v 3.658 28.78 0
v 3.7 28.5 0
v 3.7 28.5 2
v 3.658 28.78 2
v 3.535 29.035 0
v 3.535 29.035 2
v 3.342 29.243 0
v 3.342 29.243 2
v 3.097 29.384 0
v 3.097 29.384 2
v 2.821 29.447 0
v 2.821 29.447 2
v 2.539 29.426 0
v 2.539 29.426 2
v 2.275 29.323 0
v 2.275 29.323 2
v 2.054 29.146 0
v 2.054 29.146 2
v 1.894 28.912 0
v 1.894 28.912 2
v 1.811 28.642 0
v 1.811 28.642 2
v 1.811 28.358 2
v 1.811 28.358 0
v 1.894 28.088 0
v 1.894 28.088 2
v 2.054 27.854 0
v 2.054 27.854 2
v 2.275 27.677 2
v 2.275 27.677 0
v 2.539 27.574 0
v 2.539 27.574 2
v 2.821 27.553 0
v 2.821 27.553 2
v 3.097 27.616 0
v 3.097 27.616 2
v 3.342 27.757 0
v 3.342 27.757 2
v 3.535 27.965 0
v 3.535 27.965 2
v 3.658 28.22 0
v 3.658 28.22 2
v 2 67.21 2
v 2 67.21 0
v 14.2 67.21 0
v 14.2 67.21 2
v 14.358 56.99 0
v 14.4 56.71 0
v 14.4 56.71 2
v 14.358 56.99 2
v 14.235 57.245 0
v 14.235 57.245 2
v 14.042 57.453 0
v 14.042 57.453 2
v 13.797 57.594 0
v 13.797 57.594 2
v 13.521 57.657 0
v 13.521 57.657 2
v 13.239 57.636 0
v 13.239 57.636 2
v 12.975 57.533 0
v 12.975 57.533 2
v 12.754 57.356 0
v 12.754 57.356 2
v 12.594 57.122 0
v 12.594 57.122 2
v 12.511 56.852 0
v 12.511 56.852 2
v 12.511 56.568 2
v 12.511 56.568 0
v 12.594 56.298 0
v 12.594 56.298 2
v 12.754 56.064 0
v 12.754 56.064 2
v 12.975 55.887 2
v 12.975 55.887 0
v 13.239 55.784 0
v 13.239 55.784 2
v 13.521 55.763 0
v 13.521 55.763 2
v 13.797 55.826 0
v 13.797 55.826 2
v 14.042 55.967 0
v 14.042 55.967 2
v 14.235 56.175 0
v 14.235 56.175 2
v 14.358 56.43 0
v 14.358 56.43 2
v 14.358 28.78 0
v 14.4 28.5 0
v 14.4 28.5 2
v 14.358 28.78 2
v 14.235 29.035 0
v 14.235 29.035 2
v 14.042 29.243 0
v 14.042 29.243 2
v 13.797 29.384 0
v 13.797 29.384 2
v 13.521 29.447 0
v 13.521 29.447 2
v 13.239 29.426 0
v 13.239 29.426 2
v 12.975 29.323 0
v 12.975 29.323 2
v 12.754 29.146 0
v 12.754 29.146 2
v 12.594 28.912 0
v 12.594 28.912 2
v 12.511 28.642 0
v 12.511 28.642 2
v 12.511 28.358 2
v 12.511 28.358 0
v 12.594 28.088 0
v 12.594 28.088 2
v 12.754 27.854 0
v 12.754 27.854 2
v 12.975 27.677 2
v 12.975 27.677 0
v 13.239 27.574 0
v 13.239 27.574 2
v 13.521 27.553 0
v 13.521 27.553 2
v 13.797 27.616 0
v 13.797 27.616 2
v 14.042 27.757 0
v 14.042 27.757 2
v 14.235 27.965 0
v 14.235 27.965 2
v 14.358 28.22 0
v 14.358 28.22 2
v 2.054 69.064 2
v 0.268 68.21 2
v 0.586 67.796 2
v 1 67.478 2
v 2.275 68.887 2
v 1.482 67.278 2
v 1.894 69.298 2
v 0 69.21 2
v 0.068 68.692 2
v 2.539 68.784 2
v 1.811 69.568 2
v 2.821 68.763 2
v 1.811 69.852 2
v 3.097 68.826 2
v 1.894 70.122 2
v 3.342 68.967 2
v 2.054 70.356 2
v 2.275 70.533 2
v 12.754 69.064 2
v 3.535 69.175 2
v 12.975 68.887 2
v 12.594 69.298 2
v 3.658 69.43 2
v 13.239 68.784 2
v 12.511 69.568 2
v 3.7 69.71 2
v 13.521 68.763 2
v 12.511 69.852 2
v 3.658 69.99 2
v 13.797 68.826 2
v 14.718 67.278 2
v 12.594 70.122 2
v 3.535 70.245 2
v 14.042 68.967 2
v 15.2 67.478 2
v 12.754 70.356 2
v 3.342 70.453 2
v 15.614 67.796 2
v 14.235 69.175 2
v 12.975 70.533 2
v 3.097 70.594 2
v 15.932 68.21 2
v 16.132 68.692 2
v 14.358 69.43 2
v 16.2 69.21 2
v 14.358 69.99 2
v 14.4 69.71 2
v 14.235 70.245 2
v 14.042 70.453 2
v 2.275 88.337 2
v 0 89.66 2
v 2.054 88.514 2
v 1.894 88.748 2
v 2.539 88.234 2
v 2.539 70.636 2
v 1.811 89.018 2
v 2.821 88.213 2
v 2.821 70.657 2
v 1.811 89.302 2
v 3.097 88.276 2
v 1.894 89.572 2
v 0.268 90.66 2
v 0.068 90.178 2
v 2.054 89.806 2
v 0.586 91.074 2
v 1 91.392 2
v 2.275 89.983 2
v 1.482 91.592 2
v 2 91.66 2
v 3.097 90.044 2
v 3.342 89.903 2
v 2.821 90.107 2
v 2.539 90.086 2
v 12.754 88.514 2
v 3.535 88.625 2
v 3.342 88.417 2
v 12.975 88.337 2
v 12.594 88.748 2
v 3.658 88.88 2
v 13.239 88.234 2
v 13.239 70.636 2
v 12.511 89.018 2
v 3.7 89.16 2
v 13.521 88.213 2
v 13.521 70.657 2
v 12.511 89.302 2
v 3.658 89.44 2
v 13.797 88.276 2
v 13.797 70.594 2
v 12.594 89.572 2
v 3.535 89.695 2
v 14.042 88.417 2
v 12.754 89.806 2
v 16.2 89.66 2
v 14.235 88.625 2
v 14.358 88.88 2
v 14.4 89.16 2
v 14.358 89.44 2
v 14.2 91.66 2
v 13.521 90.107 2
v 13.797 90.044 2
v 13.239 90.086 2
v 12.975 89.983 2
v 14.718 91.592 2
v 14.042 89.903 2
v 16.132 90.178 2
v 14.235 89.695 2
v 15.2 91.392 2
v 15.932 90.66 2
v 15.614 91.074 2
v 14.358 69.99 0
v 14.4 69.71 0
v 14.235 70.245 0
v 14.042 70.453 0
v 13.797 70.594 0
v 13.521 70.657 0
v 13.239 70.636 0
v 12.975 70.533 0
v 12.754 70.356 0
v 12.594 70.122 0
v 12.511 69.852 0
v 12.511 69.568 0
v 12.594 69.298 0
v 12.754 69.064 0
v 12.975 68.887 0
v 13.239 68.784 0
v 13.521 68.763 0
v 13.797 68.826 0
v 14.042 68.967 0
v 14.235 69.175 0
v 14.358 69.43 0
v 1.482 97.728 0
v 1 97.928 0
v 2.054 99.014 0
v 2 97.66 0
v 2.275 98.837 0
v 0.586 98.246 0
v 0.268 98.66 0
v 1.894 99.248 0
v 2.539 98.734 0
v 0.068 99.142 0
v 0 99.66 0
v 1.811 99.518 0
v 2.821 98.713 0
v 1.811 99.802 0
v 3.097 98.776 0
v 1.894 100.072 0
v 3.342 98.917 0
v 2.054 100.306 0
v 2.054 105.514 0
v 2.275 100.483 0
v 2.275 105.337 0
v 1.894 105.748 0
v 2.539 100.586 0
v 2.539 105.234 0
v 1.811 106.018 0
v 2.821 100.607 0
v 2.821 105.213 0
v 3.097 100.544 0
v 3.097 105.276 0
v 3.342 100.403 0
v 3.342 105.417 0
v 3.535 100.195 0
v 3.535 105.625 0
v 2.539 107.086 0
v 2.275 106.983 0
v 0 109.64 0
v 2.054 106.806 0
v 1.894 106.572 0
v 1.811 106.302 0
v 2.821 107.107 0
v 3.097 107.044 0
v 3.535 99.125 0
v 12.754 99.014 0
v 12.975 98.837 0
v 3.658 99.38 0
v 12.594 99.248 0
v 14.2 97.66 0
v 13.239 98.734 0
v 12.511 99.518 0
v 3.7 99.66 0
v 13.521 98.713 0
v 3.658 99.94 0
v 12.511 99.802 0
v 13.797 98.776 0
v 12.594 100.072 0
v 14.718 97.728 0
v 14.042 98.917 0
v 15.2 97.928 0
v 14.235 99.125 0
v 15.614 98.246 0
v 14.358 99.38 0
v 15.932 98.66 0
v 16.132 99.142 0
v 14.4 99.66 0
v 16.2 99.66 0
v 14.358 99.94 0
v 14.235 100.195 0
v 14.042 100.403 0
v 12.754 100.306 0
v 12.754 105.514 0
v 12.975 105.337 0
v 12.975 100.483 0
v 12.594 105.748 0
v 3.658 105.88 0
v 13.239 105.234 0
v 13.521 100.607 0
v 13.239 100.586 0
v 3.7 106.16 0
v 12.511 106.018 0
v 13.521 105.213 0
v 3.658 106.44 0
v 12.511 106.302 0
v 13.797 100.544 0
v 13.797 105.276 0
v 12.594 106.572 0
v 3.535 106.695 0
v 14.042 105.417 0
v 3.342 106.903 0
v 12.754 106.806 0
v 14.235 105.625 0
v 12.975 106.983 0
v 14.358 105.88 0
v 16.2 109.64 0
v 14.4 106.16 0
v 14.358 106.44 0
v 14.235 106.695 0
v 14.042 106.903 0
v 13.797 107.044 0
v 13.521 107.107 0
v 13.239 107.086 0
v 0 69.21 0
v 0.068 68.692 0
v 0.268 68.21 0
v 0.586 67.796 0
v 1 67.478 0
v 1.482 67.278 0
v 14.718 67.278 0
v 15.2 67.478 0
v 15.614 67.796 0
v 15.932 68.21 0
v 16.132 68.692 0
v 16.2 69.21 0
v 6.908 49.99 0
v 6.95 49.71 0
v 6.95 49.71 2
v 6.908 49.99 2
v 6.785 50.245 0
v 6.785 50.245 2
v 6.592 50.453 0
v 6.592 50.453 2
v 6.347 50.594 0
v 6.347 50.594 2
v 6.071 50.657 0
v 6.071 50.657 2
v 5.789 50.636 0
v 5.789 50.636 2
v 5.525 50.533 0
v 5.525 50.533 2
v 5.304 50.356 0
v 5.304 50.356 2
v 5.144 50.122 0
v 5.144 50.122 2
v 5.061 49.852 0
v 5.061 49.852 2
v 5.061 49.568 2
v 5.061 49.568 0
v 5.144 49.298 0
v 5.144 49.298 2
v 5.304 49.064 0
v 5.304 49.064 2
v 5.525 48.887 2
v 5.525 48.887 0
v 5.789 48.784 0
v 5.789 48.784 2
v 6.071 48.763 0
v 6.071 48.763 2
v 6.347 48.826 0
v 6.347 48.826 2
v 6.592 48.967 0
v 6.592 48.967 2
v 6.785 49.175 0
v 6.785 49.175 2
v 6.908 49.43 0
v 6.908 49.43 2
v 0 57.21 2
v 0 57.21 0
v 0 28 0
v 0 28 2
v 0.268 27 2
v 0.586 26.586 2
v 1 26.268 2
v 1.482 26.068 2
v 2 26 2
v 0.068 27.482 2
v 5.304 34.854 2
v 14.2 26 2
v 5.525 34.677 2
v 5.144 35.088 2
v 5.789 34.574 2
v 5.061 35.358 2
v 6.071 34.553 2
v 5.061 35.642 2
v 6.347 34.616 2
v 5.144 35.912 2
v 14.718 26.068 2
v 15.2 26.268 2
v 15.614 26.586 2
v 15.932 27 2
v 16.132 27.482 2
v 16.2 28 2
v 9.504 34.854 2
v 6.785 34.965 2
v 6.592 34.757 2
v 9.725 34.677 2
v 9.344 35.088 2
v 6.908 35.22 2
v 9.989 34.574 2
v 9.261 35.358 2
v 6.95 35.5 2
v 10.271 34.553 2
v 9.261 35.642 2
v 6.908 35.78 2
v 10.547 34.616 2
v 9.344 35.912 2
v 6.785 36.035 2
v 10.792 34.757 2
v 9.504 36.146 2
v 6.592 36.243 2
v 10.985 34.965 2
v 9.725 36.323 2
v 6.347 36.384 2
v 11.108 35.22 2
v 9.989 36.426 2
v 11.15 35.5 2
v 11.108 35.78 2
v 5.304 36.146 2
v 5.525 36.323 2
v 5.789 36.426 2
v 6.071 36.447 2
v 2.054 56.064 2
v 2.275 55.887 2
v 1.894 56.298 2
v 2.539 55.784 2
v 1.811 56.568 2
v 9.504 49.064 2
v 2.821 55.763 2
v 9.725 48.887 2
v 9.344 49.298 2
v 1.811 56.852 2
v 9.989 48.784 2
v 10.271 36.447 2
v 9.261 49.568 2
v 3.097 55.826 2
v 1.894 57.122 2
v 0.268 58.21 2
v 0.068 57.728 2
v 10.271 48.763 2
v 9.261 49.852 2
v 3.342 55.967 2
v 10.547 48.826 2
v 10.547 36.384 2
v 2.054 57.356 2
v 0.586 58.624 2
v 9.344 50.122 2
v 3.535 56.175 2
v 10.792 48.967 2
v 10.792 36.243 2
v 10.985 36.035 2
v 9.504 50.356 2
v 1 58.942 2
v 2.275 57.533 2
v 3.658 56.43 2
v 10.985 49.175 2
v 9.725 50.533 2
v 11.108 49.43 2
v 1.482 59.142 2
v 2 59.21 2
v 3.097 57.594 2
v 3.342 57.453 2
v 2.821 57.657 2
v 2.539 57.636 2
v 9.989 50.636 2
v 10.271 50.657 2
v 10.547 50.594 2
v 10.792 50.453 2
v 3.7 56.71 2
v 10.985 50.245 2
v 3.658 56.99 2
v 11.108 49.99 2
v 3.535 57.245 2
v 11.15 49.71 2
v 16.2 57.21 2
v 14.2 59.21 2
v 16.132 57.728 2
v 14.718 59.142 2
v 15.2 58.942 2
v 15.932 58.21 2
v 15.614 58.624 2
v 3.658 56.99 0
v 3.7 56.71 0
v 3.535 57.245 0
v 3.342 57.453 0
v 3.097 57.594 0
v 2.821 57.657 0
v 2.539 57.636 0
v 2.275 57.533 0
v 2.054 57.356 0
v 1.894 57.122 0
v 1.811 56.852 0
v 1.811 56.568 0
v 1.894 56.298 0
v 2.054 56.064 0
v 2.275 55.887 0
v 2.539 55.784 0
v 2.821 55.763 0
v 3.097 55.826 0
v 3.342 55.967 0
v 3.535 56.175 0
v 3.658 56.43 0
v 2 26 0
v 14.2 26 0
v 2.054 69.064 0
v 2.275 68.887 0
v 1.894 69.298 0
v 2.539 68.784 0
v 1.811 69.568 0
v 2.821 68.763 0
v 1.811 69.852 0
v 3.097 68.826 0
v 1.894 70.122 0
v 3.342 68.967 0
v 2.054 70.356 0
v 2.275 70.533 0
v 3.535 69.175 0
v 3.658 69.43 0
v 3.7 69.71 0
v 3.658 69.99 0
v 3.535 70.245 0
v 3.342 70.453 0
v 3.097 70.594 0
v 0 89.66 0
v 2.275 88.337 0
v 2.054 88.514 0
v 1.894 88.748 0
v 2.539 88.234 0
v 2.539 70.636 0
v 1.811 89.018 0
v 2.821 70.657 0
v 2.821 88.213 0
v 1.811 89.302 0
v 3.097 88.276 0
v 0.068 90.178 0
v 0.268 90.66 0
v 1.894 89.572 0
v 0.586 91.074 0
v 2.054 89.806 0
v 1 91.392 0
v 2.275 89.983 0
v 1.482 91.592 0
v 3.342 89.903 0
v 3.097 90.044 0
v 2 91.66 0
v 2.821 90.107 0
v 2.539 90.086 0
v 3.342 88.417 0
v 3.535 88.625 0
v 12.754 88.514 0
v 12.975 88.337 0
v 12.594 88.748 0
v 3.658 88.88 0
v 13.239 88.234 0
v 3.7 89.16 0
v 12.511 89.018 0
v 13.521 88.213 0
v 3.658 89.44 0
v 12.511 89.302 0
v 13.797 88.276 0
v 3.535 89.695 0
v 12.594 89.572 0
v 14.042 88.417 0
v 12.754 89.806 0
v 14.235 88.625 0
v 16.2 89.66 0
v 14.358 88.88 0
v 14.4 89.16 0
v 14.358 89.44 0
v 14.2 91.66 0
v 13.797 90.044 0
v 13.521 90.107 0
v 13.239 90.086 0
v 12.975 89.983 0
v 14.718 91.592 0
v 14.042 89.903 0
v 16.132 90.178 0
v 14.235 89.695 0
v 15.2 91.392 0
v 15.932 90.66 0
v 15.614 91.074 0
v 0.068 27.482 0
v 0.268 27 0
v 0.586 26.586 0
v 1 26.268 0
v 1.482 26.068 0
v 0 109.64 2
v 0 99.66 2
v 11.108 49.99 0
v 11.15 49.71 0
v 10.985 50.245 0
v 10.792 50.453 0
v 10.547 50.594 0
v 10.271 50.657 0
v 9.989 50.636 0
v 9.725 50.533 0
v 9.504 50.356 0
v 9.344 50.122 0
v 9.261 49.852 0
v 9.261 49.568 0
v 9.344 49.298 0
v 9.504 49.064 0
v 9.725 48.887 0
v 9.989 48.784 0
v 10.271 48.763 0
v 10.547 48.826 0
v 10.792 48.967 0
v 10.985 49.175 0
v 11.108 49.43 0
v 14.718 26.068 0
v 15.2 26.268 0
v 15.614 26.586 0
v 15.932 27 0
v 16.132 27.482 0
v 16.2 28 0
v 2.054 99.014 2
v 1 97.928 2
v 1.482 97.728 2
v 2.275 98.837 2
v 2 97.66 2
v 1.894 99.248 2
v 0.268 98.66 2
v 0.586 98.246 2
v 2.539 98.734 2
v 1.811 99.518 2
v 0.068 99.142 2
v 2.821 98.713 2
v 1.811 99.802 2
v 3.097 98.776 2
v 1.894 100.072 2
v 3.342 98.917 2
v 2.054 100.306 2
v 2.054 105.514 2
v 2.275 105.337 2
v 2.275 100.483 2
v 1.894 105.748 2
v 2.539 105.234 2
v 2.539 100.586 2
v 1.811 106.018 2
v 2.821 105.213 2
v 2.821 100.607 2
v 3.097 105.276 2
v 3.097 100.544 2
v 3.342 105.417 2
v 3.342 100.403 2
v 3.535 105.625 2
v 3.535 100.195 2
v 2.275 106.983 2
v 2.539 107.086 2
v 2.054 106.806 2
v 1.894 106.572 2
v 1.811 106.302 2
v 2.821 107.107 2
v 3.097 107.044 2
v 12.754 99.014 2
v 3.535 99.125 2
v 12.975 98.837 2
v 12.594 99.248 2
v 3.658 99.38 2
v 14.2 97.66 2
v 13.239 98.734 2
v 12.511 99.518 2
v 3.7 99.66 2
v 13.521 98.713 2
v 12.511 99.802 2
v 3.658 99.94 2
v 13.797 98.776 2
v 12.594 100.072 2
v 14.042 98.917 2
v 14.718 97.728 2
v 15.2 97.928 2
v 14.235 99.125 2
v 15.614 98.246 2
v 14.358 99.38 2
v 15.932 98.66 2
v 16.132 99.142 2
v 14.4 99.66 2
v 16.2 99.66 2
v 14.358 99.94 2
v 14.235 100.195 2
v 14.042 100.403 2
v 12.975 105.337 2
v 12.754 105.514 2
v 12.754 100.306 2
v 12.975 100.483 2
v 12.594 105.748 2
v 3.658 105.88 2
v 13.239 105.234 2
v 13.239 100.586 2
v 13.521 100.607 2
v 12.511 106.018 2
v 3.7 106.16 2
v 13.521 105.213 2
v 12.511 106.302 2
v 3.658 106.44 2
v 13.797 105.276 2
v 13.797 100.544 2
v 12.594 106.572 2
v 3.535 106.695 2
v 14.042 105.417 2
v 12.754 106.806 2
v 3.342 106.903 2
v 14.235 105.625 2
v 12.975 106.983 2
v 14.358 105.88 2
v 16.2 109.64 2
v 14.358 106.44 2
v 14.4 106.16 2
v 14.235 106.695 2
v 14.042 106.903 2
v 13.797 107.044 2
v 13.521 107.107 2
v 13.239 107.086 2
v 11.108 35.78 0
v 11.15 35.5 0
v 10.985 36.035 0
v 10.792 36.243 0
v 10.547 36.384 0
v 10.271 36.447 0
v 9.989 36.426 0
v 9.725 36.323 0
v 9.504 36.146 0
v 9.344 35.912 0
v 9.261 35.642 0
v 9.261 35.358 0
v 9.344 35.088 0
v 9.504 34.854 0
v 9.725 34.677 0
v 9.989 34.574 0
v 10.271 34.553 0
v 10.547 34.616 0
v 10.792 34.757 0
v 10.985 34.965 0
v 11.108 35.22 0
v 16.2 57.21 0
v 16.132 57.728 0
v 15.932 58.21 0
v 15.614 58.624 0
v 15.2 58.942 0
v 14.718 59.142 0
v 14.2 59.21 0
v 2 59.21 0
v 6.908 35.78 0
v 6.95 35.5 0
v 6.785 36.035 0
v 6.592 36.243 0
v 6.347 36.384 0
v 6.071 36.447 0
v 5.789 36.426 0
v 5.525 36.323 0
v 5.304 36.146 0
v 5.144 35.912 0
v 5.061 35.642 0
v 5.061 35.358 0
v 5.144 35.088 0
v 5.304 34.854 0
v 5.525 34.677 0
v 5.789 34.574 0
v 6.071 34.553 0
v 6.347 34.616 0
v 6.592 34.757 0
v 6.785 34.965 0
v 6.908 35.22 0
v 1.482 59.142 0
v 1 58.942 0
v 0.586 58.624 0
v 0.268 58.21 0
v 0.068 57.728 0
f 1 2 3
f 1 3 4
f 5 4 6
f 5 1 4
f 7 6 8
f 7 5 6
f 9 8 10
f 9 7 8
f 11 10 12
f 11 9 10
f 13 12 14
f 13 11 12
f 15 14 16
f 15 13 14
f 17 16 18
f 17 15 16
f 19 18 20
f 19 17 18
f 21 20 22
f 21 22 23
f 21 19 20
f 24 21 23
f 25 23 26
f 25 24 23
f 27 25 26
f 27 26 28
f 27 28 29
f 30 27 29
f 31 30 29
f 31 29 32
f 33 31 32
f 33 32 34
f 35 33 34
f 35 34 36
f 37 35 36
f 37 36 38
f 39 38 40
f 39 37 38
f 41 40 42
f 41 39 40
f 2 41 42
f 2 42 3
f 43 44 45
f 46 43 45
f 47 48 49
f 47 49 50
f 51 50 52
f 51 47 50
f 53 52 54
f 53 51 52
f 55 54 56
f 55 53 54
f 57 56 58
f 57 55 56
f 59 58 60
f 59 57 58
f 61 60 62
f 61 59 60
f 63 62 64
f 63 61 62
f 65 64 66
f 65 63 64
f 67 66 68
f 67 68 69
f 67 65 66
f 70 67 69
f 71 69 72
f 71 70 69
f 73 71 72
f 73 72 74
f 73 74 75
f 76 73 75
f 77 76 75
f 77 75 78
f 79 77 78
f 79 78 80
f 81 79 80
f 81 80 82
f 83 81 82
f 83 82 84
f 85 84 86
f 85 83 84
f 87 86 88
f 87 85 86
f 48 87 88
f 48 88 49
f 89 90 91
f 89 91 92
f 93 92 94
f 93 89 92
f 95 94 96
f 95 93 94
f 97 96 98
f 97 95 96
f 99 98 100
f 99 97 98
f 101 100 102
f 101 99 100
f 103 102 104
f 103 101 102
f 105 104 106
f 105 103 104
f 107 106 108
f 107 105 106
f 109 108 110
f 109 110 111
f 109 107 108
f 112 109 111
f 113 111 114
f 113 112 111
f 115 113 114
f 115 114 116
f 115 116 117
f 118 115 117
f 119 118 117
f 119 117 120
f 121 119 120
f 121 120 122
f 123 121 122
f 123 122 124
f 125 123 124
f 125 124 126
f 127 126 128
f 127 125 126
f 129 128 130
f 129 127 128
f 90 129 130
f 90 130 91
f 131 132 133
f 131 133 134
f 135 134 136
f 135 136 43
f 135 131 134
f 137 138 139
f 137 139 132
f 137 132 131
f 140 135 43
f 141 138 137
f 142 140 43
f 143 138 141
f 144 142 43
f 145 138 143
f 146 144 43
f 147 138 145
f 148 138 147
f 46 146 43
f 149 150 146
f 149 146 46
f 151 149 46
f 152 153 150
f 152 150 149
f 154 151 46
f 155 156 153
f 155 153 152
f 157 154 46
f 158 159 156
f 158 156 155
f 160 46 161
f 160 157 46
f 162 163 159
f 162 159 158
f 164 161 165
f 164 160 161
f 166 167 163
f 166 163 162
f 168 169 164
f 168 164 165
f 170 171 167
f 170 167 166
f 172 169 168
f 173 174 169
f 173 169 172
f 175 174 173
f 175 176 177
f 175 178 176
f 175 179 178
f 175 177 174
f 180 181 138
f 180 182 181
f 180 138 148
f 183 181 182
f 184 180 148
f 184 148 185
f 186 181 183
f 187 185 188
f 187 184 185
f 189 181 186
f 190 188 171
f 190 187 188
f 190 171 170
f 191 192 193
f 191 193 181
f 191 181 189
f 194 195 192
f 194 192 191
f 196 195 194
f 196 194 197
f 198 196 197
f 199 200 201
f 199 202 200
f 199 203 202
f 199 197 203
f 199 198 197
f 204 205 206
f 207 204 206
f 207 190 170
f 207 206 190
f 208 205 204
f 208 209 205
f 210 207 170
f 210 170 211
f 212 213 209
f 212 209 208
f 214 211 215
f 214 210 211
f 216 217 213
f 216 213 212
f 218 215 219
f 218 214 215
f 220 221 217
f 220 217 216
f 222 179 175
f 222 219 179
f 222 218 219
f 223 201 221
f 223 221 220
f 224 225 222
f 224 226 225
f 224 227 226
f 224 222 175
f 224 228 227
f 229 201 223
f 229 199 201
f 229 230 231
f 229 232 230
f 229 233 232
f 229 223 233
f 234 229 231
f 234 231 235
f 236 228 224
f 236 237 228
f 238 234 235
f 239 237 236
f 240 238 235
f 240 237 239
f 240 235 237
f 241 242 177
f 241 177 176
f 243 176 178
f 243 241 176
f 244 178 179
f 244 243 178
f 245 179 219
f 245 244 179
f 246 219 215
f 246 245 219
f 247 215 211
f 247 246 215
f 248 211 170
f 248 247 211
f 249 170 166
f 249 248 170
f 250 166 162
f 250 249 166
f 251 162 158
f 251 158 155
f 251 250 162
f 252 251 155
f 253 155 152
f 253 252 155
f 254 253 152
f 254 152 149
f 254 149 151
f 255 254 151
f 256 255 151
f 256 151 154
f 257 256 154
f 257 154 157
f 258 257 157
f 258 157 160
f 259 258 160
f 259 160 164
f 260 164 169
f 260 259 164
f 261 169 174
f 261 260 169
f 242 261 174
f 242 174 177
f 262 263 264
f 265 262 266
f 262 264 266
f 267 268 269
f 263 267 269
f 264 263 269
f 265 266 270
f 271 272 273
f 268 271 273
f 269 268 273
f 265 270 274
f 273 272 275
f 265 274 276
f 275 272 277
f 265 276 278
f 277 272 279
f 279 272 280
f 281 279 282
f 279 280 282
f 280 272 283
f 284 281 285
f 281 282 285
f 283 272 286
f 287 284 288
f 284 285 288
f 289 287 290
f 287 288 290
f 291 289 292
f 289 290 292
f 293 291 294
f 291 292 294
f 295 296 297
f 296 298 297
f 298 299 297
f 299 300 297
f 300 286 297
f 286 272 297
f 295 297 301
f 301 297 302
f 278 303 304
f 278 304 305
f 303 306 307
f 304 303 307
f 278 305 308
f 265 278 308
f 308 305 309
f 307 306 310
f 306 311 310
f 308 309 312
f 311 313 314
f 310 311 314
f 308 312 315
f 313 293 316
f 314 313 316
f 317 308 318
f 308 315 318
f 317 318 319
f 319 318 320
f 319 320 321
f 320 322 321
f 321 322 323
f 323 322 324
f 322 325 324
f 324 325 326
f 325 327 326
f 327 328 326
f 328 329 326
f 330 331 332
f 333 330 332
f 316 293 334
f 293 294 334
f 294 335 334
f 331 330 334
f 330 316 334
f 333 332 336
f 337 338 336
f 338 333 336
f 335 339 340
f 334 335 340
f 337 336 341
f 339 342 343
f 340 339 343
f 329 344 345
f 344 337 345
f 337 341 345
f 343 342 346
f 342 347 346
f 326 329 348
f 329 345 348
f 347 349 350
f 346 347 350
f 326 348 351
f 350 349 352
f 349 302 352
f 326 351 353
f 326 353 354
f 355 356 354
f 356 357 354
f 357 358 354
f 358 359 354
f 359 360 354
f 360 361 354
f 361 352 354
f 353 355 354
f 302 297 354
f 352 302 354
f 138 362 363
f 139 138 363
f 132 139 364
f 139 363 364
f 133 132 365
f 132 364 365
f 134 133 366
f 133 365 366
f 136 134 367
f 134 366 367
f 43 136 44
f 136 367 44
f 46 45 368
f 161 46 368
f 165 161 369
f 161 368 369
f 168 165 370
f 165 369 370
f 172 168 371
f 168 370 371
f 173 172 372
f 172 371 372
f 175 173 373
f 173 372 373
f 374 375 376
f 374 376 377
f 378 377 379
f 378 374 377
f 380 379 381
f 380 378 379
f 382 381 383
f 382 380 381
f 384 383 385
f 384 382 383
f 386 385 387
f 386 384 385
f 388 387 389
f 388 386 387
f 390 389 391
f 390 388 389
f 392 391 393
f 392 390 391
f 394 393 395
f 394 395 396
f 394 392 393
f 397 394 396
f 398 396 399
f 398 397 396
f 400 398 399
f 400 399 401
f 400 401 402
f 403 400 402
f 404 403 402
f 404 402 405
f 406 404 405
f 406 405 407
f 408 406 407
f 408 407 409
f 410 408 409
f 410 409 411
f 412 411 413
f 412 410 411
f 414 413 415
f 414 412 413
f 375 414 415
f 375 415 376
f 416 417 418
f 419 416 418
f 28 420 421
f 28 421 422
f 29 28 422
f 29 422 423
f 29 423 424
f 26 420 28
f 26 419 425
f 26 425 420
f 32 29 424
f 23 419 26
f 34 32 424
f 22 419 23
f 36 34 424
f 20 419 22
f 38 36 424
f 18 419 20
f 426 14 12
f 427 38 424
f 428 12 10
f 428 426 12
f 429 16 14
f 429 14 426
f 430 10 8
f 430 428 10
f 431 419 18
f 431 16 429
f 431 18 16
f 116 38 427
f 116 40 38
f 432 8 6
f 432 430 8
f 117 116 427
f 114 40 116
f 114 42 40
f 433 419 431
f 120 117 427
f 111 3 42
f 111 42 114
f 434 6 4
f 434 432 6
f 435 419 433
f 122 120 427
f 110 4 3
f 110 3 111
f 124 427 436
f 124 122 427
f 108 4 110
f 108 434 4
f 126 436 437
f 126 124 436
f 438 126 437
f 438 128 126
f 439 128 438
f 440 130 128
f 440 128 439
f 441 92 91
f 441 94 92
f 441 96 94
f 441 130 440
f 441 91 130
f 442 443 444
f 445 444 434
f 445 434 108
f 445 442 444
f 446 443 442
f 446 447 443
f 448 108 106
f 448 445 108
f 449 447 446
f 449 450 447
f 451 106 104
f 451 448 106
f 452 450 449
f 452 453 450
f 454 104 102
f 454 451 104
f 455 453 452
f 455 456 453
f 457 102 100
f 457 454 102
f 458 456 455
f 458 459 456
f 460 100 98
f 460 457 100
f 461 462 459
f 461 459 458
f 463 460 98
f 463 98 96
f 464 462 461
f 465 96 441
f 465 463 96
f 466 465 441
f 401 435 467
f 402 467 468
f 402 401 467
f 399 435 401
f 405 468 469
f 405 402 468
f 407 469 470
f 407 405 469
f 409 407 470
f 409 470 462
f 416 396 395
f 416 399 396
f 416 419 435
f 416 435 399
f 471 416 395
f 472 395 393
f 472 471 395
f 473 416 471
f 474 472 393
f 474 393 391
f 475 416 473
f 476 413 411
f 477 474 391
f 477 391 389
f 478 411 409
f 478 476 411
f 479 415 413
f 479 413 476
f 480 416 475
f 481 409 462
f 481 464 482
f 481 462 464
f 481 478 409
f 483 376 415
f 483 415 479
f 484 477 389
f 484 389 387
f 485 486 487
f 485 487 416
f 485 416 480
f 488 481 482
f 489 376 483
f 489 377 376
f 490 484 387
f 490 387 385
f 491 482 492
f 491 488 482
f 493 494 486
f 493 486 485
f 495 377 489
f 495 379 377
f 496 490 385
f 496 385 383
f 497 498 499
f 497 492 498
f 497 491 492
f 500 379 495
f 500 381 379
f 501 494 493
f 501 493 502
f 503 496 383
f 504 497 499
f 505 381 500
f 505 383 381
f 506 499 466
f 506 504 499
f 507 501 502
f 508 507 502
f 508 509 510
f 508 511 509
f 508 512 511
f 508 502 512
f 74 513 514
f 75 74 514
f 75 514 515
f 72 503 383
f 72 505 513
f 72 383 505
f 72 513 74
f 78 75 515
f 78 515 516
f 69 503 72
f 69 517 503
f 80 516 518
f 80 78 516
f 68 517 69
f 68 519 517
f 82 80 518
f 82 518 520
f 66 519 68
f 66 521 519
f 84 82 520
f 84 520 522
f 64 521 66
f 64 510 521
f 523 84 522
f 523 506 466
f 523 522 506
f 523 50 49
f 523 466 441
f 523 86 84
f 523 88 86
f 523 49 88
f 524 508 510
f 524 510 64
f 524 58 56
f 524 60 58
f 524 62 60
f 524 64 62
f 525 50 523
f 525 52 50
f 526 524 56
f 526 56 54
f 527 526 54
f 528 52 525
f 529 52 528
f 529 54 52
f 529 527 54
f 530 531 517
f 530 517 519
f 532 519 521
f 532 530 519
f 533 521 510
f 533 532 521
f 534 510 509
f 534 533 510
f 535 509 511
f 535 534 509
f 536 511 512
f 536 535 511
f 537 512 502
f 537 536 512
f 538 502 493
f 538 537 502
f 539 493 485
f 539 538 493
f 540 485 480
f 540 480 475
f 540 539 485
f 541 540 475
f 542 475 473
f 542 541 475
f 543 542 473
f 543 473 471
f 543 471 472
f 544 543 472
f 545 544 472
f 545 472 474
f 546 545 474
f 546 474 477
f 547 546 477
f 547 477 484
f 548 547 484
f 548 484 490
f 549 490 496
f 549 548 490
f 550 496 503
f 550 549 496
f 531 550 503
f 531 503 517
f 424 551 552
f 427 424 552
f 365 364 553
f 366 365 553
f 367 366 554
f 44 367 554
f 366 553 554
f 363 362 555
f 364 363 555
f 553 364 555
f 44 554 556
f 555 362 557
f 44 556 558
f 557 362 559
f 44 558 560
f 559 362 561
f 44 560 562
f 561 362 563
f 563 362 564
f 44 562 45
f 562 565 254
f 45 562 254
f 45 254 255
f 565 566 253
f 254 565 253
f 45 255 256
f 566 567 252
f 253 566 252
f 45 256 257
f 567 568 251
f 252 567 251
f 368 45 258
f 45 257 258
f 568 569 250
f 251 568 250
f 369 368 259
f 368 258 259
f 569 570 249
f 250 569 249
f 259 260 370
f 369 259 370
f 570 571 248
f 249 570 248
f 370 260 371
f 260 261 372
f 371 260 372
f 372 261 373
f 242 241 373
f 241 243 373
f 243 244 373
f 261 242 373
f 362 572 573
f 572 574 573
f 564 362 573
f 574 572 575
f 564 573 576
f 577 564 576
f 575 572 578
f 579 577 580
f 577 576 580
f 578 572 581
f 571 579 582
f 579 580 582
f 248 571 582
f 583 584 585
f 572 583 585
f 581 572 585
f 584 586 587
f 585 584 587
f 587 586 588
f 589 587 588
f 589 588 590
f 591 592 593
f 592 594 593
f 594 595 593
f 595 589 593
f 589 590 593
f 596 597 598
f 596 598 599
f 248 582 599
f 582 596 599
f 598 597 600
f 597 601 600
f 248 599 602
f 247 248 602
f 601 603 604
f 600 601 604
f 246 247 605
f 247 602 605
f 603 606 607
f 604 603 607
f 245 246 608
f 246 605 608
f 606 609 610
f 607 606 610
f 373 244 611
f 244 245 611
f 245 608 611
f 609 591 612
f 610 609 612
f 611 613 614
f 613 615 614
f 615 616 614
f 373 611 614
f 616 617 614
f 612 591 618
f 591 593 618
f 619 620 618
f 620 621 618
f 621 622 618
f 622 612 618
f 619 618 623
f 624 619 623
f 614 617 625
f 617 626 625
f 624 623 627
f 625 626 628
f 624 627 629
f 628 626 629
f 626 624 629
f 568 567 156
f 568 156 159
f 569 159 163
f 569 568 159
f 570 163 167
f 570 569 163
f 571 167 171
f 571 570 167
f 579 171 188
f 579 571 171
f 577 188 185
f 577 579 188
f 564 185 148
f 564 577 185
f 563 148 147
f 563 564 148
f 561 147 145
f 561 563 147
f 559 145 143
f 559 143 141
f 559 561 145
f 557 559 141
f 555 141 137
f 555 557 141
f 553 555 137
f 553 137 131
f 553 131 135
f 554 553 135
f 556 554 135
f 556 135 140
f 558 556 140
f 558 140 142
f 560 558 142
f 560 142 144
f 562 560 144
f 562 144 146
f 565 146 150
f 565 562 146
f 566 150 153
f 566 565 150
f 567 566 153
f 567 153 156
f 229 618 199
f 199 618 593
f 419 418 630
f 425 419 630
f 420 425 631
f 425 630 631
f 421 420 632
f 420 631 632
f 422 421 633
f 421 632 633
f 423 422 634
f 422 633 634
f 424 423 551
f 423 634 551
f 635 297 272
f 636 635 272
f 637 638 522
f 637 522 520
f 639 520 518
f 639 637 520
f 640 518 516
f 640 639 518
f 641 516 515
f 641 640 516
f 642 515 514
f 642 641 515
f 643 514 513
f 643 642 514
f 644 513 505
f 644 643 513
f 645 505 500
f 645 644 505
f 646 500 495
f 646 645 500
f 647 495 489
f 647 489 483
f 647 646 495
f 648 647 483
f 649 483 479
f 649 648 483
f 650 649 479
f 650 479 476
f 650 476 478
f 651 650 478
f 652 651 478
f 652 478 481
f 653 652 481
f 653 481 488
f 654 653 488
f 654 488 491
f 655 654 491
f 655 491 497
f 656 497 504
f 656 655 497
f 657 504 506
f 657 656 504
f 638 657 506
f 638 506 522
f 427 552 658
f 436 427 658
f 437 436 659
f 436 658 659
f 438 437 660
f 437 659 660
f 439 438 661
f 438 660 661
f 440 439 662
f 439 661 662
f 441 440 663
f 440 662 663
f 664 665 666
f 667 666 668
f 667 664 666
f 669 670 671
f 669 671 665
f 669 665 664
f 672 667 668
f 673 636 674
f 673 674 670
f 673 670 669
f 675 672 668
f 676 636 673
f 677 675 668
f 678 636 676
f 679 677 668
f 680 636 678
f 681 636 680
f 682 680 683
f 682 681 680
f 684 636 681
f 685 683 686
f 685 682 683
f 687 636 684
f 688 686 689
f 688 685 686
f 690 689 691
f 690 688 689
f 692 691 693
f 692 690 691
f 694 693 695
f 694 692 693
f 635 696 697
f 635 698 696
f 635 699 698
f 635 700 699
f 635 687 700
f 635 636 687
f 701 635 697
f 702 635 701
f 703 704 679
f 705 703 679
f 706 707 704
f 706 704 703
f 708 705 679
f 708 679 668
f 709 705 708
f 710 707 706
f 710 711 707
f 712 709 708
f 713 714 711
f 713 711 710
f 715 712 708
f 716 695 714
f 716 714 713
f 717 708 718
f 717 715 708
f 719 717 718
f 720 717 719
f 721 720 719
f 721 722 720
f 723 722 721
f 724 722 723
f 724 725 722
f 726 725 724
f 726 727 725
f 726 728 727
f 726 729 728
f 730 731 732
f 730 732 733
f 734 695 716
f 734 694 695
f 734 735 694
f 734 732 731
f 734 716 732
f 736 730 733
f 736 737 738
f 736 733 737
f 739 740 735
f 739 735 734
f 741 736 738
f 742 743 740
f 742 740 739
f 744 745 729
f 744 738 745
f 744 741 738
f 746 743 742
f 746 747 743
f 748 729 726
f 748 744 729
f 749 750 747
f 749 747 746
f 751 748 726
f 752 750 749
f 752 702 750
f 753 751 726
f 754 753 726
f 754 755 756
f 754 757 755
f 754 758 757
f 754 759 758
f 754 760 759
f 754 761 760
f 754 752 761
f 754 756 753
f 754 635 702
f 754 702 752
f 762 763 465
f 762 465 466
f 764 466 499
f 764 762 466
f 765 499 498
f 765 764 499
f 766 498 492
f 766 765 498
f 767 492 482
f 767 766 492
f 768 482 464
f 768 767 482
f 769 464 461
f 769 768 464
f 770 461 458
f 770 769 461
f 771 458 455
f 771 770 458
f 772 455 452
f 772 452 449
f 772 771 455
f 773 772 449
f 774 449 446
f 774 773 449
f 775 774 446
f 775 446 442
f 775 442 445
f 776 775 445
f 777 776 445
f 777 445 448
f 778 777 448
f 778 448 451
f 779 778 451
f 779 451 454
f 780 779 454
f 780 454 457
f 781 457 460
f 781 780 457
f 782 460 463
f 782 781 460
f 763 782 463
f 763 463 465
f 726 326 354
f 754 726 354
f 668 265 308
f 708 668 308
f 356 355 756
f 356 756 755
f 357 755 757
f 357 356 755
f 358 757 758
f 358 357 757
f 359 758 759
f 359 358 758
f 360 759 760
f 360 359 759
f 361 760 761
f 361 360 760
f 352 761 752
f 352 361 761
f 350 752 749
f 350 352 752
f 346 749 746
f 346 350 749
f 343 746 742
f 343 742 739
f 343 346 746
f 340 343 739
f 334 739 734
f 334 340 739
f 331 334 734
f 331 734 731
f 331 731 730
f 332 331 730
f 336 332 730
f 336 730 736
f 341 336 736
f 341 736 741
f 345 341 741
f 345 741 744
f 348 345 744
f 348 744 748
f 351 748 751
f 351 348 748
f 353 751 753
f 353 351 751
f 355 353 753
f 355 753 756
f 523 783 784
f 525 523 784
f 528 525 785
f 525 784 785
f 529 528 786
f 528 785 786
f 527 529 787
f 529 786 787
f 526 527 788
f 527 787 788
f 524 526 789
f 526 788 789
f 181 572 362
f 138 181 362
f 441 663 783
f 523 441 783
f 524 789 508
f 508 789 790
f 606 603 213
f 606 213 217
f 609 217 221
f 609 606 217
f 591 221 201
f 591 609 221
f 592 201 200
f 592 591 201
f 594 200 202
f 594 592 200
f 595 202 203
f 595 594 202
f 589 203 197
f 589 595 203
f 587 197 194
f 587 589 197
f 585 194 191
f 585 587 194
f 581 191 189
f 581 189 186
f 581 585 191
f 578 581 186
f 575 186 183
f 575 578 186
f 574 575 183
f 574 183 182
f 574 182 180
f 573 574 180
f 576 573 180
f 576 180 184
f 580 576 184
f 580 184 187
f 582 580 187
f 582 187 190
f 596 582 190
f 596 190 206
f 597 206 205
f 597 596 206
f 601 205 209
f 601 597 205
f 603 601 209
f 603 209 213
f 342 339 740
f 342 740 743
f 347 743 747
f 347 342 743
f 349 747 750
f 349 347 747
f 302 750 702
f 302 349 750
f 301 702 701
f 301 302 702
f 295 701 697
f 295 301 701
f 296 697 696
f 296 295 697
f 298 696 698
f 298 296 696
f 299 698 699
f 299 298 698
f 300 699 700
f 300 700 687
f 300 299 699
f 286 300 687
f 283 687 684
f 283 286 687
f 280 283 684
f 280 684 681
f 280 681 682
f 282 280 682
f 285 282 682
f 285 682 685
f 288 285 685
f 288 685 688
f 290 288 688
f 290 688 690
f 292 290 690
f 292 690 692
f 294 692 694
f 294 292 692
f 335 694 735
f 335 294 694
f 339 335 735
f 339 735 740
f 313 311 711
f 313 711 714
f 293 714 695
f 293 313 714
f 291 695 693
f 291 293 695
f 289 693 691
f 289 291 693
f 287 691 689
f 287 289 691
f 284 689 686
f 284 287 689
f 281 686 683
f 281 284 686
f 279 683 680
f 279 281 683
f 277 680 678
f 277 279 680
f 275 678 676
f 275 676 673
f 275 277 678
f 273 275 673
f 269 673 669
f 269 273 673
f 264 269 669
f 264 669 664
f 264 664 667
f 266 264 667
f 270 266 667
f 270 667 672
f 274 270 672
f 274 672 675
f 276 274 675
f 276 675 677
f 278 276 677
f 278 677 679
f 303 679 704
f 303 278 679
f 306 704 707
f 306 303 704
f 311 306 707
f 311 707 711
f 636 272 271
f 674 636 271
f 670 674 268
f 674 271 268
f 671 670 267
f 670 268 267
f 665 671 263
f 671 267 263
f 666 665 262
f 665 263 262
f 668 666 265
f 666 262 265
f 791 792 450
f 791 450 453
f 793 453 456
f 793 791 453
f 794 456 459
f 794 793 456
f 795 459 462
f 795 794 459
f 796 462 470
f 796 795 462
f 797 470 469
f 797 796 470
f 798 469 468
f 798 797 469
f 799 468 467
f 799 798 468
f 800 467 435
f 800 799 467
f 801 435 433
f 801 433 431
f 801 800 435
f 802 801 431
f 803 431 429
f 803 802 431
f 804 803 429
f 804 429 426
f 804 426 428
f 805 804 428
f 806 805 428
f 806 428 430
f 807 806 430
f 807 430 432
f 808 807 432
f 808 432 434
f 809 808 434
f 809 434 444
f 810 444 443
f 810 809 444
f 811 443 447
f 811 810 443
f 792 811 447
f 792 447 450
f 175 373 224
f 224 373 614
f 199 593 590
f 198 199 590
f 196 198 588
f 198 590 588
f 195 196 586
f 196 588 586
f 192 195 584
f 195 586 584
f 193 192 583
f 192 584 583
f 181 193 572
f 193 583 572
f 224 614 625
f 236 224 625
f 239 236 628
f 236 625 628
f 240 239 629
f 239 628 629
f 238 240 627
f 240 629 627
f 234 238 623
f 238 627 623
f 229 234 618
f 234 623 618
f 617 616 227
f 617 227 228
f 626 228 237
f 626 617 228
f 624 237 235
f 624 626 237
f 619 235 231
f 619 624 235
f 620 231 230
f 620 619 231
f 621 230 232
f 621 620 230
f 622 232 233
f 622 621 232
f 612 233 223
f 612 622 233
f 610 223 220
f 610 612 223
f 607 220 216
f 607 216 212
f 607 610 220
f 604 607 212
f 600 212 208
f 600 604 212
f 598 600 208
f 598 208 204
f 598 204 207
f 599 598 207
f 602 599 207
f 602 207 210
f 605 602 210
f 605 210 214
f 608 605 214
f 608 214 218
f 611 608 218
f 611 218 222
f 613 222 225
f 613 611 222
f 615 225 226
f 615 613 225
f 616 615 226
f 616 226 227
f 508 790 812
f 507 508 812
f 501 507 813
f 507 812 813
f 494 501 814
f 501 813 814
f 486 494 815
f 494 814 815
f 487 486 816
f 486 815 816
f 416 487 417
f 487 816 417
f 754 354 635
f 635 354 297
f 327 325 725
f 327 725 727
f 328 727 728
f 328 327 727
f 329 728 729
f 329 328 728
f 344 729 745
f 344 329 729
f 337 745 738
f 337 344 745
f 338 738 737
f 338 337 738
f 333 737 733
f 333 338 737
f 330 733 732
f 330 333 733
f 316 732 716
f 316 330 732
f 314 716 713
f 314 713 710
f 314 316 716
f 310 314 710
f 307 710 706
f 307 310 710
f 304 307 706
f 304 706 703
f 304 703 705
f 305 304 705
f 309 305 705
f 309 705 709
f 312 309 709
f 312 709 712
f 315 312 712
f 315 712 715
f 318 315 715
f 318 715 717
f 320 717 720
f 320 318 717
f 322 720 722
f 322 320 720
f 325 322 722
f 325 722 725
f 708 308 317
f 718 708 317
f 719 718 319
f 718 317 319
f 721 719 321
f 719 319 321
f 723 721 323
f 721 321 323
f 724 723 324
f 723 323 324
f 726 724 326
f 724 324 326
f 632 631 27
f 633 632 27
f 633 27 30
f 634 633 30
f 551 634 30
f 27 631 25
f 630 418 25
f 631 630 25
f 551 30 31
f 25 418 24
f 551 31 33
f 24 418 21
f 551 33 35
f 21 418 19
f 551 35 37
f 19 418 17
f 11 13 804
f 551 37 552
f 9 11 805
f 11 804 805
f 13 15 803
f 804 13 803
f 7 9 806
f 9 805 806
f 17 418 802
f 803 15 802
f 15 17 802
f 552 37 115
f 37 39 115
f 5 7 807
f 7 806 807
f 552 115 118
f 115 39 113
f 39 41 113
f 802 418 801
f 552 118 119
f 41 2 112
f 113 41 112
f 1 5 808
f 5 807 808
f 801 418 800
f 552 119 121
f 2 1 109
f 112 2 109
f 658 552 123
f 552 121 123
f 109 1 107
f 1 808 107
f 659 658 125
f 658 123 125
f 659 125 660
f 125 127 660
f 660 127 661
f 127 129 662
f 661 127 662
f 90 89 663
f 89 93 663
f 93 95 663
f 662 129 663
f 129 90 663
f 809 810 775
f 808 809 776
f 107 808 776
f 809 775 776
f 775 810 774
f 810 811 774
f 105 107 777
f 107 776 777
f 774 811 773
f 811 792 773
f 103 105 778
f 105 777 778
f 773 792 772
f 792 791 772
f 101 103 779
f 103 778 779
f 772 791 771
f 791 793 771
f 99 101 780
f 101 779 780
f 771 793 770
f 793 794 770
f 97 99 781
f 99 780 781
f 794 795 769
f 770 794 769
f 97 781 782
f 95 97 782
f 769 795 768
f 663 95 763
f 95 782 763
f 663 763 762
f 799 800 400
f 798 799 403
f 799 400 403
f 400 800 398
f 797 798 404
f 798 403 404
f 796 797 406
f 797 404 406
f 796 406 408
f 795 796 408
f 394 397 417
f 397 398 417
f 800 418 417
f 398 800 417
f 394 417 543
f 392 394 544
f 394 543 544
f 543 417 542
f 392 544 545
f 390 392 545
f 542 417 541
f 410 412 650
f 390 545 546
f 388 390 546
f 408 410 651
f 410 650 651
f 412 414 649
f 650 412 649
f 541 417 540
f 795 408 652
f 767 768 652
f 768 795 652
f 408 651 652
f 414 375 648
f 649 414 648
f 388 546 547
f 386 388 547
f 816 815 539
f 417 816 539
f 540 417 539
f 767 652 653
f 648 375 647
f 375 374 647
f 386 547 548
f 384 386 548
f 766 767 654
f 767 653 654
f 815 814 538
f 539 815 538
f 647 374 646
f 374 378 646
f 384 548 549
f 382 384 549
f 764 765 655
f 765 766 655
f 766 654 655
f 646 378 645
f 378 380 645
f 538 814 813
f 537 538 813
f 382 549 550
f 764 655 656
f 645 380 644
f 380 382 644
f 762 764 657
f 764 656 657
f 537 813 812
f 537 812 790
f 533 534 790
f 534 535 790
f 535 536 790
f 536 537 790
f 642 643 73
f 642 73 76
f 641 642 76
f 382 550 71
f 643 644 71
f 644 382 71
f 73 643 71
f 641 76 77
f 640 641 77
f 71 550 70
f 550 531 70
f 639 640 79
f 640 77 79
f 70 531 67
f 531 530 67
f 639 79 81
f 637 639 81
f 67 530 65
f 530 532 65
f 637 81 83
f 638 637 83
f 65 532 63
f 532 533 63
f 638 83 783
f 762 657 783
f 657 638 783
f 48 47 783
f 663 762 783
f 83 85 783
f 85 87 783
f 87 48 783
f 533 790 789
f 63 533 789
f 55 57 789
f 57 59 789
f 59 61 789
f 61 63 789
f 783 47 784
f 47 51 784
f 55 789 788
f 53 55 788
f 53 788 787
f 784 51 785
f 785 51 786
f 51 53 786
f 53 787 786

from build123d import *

# Parameters (mm, degrees)
SKETCH1_R           = 0.95
SKETCH1_W           = 4.2
SKETCH1_H           = 8
SKETCH1_W_2         = 8.2
SKETCH1_H_2         = 6
BOSS_EXTRUDE1_DEPTH = 2
SKETCH2_W           = 10.7
SKETCH2_H           = 6
SKETCH2_W_2         = 8.2
SKETCH2_H_2         = 8
SKETCH2_H_3         = 12
CUT_EXTRUDE1_DEPTH  = 2


with BuildPart() as part:
    # Sketch1 → Boss-Extrude1 (new body)
    with BuildSketch(Plane.XY):
        with BuildLine():
            Line((16.2, 109.64), (0, 109.64))
            Line((0, 109.64), (0, 99.66))
            ThreePointArc((0, 99.66), (0.585786438, 98.245786438), (2, 97.66))
            Line((2, 97.66), (2.75, 97.66))
            Line((2.75, 97.66), (2.75, 91.66))
            Line((2.75, 91.66), (2, 91.66))
            ThreePointArc((2, 91.66), (0.585786438, 91.074213562), (0, 89.66))
            Line((0, 89.66), (0, 69.21))
            ThreePointArc((0, 69.21), (0.585786438, 67.795786438), (2, 67.21))
            Line((2, 67.21), (4, 67.21))
            Line((4, 67.21), (4, 59.21))
            Line((4, 59.21), (2, 59.21))
            ThreePointArc((2, 59.21), (0.585786438, 58.624213562), (0, 57.21))
            Line((0, 57.21), (0, 28))
            ThreePointArc((0, 28), (0.585786438, 26.585786438), (2, 26))
            Line((2, 26), (4, 26))
            Line((4, 26), (4, 14))
            Line((4, 14), (6, 14))
            Line((6, 14), (6, 26))
            Line((6, 26), (10.2, 26))
            Line((10.2, 26), (10.2, 14))
            Line((10.2, 14), (12.2, 14))
            Line((12.2, 14), (12.2, 26))
            Line((12.2, 26), (14.2, 26))
            ThreePointArc((14.2, 26), (15.614213562, 26.585786438), (16.2, 28))
            Line((16.2, 28), (16.2, 57.21))
            ThreePointArc((16.2, 57.21), (15.614213562, 58.624213562), (14.2, 59.21))
            Line((14.2, 59.21), (12.2, 59.21))
            Line((12.2, 59.21), (12.2, 67.21))
            Line((12.2, 67.21), (14.2, 67.21))
            ThreePointArc((14.2, 67.21), (15.614213562, 67.795786438), (16.2, 69.21))
            Line((16.2, 69.21), (16.2, 89.66))
            ThreePointArc((16.2, 89.66), (15.614213562, 91.074213562), (14.2, 91.66))
            Line((14.2, 91.66), (13.45, 91.66))
            Line((13.45, 91.66), (13.45, 97.66))
            Line((13.45, 97.66), (14.2, 97.66))
            ThreePointArc((14.2, 97.66), (15.614213562, 98.245786438), (16.2, 99.66))
            Line((16.2, 99.66), (16.2, 109.64))
        make_face()
        with Locations((13.45, 56.71)):
            Circle(SKETCH1_R, mode=Mode.SUBTRACT)
        with Locations((10.2, 49.71)):
            Circle(SKETCH1_R, mode=Mode.SUBTRACT)
        with Locations((13.45, 106.16)):
            Circle(SKETCH1_R, mode=Mode.SUBTRACT)
        with Locations((2.75, 99.66)):
            Circle(SKETCH1_R, mode=Mode.SUBTRACT)
        with Locations((6, 49.71)):
            Circle(SKETCH1_R, mode=Mode.SUBTRACT)
        with Locations((2.75, 28.5)):
            Circle(SKETCH1_R, mode=Mode.SUBTRACT)
        with Locations((2.75, 89.16)):
            Circle(SKETCH1_R, mode=Mode.SUBTRACT)
        with Locations((2.75, 56.71)):
            Circle(SKETCH1_R, mode=Mode.SUBTRACT)
        with Locations((13.45, 89.16)):
            Circle(SKETCH1_R, mode=Mode.SUBTRACT)
        with Locations((13.45, 99.66)):
            Circle(SKETCH1_R, mode=Mode.SUBTRACT)
        with Locations((13.45, 69.71)):
            Circle(SKETCH1_R, mode=Mode.SUBTRACT)
        with Locations((6, 35.5)):
            Circle(SKETCH1_R, mode=Mode.SUBTRACT)
        with Locations((2.75, 106.16)):
            Circle(SKETCH1_R, mode=Mode.SUBTRACT)
        with Locations((10.2, 35.5)):
            Circle(SKETCH1_R, mode=Mode.SUBTRACT)
        with Locations((2.75, 69.71)):
            Circle(SKETCH1_R, mode=Mode.SUBTRACT)
        with Locations((13.45, 28.5)):
            Circle(SKETCH1_R, mode=Mode.SUBTRACT)
        with Locations((8.1, 63.21)):
            Rectangle(SKETCH1_W, SKETCH1_H, mode=Mode.SUBTRACT)
        with Locations((8.1, 94.66)):
            Rectangle(SKETCH1_W_2, SKETCH1_H_2, mode=Mode.SUBTRACT)
    extrude(amount=BOSS_EXTRUDE1_DEPTH)

    # Sketch2 → Cut-Extrude1 (cut)
    with BuildSketch(Plane(origin=(0, 0, 0), x_dir=(-1, 0, 0), z_dir=(0, 0, -1))):
        with Locations((-8.1, 94.66)):
            Rectangle(SKETCH2_W, SKETCH2_H)
        with Locations((-8.1, 63.21)):
            Rectangle(SKETCH2_W_2, SKETCH2_H_2)
        with Locations((-8.1, 20)):
            Rectangle(SKETCH2_W_2, SKETCH2_H_3)
    extrude(amount=-CUT_EXTRUDE1_DEPTH, mode=Mode.SUBTRACT)


solid = part.part
